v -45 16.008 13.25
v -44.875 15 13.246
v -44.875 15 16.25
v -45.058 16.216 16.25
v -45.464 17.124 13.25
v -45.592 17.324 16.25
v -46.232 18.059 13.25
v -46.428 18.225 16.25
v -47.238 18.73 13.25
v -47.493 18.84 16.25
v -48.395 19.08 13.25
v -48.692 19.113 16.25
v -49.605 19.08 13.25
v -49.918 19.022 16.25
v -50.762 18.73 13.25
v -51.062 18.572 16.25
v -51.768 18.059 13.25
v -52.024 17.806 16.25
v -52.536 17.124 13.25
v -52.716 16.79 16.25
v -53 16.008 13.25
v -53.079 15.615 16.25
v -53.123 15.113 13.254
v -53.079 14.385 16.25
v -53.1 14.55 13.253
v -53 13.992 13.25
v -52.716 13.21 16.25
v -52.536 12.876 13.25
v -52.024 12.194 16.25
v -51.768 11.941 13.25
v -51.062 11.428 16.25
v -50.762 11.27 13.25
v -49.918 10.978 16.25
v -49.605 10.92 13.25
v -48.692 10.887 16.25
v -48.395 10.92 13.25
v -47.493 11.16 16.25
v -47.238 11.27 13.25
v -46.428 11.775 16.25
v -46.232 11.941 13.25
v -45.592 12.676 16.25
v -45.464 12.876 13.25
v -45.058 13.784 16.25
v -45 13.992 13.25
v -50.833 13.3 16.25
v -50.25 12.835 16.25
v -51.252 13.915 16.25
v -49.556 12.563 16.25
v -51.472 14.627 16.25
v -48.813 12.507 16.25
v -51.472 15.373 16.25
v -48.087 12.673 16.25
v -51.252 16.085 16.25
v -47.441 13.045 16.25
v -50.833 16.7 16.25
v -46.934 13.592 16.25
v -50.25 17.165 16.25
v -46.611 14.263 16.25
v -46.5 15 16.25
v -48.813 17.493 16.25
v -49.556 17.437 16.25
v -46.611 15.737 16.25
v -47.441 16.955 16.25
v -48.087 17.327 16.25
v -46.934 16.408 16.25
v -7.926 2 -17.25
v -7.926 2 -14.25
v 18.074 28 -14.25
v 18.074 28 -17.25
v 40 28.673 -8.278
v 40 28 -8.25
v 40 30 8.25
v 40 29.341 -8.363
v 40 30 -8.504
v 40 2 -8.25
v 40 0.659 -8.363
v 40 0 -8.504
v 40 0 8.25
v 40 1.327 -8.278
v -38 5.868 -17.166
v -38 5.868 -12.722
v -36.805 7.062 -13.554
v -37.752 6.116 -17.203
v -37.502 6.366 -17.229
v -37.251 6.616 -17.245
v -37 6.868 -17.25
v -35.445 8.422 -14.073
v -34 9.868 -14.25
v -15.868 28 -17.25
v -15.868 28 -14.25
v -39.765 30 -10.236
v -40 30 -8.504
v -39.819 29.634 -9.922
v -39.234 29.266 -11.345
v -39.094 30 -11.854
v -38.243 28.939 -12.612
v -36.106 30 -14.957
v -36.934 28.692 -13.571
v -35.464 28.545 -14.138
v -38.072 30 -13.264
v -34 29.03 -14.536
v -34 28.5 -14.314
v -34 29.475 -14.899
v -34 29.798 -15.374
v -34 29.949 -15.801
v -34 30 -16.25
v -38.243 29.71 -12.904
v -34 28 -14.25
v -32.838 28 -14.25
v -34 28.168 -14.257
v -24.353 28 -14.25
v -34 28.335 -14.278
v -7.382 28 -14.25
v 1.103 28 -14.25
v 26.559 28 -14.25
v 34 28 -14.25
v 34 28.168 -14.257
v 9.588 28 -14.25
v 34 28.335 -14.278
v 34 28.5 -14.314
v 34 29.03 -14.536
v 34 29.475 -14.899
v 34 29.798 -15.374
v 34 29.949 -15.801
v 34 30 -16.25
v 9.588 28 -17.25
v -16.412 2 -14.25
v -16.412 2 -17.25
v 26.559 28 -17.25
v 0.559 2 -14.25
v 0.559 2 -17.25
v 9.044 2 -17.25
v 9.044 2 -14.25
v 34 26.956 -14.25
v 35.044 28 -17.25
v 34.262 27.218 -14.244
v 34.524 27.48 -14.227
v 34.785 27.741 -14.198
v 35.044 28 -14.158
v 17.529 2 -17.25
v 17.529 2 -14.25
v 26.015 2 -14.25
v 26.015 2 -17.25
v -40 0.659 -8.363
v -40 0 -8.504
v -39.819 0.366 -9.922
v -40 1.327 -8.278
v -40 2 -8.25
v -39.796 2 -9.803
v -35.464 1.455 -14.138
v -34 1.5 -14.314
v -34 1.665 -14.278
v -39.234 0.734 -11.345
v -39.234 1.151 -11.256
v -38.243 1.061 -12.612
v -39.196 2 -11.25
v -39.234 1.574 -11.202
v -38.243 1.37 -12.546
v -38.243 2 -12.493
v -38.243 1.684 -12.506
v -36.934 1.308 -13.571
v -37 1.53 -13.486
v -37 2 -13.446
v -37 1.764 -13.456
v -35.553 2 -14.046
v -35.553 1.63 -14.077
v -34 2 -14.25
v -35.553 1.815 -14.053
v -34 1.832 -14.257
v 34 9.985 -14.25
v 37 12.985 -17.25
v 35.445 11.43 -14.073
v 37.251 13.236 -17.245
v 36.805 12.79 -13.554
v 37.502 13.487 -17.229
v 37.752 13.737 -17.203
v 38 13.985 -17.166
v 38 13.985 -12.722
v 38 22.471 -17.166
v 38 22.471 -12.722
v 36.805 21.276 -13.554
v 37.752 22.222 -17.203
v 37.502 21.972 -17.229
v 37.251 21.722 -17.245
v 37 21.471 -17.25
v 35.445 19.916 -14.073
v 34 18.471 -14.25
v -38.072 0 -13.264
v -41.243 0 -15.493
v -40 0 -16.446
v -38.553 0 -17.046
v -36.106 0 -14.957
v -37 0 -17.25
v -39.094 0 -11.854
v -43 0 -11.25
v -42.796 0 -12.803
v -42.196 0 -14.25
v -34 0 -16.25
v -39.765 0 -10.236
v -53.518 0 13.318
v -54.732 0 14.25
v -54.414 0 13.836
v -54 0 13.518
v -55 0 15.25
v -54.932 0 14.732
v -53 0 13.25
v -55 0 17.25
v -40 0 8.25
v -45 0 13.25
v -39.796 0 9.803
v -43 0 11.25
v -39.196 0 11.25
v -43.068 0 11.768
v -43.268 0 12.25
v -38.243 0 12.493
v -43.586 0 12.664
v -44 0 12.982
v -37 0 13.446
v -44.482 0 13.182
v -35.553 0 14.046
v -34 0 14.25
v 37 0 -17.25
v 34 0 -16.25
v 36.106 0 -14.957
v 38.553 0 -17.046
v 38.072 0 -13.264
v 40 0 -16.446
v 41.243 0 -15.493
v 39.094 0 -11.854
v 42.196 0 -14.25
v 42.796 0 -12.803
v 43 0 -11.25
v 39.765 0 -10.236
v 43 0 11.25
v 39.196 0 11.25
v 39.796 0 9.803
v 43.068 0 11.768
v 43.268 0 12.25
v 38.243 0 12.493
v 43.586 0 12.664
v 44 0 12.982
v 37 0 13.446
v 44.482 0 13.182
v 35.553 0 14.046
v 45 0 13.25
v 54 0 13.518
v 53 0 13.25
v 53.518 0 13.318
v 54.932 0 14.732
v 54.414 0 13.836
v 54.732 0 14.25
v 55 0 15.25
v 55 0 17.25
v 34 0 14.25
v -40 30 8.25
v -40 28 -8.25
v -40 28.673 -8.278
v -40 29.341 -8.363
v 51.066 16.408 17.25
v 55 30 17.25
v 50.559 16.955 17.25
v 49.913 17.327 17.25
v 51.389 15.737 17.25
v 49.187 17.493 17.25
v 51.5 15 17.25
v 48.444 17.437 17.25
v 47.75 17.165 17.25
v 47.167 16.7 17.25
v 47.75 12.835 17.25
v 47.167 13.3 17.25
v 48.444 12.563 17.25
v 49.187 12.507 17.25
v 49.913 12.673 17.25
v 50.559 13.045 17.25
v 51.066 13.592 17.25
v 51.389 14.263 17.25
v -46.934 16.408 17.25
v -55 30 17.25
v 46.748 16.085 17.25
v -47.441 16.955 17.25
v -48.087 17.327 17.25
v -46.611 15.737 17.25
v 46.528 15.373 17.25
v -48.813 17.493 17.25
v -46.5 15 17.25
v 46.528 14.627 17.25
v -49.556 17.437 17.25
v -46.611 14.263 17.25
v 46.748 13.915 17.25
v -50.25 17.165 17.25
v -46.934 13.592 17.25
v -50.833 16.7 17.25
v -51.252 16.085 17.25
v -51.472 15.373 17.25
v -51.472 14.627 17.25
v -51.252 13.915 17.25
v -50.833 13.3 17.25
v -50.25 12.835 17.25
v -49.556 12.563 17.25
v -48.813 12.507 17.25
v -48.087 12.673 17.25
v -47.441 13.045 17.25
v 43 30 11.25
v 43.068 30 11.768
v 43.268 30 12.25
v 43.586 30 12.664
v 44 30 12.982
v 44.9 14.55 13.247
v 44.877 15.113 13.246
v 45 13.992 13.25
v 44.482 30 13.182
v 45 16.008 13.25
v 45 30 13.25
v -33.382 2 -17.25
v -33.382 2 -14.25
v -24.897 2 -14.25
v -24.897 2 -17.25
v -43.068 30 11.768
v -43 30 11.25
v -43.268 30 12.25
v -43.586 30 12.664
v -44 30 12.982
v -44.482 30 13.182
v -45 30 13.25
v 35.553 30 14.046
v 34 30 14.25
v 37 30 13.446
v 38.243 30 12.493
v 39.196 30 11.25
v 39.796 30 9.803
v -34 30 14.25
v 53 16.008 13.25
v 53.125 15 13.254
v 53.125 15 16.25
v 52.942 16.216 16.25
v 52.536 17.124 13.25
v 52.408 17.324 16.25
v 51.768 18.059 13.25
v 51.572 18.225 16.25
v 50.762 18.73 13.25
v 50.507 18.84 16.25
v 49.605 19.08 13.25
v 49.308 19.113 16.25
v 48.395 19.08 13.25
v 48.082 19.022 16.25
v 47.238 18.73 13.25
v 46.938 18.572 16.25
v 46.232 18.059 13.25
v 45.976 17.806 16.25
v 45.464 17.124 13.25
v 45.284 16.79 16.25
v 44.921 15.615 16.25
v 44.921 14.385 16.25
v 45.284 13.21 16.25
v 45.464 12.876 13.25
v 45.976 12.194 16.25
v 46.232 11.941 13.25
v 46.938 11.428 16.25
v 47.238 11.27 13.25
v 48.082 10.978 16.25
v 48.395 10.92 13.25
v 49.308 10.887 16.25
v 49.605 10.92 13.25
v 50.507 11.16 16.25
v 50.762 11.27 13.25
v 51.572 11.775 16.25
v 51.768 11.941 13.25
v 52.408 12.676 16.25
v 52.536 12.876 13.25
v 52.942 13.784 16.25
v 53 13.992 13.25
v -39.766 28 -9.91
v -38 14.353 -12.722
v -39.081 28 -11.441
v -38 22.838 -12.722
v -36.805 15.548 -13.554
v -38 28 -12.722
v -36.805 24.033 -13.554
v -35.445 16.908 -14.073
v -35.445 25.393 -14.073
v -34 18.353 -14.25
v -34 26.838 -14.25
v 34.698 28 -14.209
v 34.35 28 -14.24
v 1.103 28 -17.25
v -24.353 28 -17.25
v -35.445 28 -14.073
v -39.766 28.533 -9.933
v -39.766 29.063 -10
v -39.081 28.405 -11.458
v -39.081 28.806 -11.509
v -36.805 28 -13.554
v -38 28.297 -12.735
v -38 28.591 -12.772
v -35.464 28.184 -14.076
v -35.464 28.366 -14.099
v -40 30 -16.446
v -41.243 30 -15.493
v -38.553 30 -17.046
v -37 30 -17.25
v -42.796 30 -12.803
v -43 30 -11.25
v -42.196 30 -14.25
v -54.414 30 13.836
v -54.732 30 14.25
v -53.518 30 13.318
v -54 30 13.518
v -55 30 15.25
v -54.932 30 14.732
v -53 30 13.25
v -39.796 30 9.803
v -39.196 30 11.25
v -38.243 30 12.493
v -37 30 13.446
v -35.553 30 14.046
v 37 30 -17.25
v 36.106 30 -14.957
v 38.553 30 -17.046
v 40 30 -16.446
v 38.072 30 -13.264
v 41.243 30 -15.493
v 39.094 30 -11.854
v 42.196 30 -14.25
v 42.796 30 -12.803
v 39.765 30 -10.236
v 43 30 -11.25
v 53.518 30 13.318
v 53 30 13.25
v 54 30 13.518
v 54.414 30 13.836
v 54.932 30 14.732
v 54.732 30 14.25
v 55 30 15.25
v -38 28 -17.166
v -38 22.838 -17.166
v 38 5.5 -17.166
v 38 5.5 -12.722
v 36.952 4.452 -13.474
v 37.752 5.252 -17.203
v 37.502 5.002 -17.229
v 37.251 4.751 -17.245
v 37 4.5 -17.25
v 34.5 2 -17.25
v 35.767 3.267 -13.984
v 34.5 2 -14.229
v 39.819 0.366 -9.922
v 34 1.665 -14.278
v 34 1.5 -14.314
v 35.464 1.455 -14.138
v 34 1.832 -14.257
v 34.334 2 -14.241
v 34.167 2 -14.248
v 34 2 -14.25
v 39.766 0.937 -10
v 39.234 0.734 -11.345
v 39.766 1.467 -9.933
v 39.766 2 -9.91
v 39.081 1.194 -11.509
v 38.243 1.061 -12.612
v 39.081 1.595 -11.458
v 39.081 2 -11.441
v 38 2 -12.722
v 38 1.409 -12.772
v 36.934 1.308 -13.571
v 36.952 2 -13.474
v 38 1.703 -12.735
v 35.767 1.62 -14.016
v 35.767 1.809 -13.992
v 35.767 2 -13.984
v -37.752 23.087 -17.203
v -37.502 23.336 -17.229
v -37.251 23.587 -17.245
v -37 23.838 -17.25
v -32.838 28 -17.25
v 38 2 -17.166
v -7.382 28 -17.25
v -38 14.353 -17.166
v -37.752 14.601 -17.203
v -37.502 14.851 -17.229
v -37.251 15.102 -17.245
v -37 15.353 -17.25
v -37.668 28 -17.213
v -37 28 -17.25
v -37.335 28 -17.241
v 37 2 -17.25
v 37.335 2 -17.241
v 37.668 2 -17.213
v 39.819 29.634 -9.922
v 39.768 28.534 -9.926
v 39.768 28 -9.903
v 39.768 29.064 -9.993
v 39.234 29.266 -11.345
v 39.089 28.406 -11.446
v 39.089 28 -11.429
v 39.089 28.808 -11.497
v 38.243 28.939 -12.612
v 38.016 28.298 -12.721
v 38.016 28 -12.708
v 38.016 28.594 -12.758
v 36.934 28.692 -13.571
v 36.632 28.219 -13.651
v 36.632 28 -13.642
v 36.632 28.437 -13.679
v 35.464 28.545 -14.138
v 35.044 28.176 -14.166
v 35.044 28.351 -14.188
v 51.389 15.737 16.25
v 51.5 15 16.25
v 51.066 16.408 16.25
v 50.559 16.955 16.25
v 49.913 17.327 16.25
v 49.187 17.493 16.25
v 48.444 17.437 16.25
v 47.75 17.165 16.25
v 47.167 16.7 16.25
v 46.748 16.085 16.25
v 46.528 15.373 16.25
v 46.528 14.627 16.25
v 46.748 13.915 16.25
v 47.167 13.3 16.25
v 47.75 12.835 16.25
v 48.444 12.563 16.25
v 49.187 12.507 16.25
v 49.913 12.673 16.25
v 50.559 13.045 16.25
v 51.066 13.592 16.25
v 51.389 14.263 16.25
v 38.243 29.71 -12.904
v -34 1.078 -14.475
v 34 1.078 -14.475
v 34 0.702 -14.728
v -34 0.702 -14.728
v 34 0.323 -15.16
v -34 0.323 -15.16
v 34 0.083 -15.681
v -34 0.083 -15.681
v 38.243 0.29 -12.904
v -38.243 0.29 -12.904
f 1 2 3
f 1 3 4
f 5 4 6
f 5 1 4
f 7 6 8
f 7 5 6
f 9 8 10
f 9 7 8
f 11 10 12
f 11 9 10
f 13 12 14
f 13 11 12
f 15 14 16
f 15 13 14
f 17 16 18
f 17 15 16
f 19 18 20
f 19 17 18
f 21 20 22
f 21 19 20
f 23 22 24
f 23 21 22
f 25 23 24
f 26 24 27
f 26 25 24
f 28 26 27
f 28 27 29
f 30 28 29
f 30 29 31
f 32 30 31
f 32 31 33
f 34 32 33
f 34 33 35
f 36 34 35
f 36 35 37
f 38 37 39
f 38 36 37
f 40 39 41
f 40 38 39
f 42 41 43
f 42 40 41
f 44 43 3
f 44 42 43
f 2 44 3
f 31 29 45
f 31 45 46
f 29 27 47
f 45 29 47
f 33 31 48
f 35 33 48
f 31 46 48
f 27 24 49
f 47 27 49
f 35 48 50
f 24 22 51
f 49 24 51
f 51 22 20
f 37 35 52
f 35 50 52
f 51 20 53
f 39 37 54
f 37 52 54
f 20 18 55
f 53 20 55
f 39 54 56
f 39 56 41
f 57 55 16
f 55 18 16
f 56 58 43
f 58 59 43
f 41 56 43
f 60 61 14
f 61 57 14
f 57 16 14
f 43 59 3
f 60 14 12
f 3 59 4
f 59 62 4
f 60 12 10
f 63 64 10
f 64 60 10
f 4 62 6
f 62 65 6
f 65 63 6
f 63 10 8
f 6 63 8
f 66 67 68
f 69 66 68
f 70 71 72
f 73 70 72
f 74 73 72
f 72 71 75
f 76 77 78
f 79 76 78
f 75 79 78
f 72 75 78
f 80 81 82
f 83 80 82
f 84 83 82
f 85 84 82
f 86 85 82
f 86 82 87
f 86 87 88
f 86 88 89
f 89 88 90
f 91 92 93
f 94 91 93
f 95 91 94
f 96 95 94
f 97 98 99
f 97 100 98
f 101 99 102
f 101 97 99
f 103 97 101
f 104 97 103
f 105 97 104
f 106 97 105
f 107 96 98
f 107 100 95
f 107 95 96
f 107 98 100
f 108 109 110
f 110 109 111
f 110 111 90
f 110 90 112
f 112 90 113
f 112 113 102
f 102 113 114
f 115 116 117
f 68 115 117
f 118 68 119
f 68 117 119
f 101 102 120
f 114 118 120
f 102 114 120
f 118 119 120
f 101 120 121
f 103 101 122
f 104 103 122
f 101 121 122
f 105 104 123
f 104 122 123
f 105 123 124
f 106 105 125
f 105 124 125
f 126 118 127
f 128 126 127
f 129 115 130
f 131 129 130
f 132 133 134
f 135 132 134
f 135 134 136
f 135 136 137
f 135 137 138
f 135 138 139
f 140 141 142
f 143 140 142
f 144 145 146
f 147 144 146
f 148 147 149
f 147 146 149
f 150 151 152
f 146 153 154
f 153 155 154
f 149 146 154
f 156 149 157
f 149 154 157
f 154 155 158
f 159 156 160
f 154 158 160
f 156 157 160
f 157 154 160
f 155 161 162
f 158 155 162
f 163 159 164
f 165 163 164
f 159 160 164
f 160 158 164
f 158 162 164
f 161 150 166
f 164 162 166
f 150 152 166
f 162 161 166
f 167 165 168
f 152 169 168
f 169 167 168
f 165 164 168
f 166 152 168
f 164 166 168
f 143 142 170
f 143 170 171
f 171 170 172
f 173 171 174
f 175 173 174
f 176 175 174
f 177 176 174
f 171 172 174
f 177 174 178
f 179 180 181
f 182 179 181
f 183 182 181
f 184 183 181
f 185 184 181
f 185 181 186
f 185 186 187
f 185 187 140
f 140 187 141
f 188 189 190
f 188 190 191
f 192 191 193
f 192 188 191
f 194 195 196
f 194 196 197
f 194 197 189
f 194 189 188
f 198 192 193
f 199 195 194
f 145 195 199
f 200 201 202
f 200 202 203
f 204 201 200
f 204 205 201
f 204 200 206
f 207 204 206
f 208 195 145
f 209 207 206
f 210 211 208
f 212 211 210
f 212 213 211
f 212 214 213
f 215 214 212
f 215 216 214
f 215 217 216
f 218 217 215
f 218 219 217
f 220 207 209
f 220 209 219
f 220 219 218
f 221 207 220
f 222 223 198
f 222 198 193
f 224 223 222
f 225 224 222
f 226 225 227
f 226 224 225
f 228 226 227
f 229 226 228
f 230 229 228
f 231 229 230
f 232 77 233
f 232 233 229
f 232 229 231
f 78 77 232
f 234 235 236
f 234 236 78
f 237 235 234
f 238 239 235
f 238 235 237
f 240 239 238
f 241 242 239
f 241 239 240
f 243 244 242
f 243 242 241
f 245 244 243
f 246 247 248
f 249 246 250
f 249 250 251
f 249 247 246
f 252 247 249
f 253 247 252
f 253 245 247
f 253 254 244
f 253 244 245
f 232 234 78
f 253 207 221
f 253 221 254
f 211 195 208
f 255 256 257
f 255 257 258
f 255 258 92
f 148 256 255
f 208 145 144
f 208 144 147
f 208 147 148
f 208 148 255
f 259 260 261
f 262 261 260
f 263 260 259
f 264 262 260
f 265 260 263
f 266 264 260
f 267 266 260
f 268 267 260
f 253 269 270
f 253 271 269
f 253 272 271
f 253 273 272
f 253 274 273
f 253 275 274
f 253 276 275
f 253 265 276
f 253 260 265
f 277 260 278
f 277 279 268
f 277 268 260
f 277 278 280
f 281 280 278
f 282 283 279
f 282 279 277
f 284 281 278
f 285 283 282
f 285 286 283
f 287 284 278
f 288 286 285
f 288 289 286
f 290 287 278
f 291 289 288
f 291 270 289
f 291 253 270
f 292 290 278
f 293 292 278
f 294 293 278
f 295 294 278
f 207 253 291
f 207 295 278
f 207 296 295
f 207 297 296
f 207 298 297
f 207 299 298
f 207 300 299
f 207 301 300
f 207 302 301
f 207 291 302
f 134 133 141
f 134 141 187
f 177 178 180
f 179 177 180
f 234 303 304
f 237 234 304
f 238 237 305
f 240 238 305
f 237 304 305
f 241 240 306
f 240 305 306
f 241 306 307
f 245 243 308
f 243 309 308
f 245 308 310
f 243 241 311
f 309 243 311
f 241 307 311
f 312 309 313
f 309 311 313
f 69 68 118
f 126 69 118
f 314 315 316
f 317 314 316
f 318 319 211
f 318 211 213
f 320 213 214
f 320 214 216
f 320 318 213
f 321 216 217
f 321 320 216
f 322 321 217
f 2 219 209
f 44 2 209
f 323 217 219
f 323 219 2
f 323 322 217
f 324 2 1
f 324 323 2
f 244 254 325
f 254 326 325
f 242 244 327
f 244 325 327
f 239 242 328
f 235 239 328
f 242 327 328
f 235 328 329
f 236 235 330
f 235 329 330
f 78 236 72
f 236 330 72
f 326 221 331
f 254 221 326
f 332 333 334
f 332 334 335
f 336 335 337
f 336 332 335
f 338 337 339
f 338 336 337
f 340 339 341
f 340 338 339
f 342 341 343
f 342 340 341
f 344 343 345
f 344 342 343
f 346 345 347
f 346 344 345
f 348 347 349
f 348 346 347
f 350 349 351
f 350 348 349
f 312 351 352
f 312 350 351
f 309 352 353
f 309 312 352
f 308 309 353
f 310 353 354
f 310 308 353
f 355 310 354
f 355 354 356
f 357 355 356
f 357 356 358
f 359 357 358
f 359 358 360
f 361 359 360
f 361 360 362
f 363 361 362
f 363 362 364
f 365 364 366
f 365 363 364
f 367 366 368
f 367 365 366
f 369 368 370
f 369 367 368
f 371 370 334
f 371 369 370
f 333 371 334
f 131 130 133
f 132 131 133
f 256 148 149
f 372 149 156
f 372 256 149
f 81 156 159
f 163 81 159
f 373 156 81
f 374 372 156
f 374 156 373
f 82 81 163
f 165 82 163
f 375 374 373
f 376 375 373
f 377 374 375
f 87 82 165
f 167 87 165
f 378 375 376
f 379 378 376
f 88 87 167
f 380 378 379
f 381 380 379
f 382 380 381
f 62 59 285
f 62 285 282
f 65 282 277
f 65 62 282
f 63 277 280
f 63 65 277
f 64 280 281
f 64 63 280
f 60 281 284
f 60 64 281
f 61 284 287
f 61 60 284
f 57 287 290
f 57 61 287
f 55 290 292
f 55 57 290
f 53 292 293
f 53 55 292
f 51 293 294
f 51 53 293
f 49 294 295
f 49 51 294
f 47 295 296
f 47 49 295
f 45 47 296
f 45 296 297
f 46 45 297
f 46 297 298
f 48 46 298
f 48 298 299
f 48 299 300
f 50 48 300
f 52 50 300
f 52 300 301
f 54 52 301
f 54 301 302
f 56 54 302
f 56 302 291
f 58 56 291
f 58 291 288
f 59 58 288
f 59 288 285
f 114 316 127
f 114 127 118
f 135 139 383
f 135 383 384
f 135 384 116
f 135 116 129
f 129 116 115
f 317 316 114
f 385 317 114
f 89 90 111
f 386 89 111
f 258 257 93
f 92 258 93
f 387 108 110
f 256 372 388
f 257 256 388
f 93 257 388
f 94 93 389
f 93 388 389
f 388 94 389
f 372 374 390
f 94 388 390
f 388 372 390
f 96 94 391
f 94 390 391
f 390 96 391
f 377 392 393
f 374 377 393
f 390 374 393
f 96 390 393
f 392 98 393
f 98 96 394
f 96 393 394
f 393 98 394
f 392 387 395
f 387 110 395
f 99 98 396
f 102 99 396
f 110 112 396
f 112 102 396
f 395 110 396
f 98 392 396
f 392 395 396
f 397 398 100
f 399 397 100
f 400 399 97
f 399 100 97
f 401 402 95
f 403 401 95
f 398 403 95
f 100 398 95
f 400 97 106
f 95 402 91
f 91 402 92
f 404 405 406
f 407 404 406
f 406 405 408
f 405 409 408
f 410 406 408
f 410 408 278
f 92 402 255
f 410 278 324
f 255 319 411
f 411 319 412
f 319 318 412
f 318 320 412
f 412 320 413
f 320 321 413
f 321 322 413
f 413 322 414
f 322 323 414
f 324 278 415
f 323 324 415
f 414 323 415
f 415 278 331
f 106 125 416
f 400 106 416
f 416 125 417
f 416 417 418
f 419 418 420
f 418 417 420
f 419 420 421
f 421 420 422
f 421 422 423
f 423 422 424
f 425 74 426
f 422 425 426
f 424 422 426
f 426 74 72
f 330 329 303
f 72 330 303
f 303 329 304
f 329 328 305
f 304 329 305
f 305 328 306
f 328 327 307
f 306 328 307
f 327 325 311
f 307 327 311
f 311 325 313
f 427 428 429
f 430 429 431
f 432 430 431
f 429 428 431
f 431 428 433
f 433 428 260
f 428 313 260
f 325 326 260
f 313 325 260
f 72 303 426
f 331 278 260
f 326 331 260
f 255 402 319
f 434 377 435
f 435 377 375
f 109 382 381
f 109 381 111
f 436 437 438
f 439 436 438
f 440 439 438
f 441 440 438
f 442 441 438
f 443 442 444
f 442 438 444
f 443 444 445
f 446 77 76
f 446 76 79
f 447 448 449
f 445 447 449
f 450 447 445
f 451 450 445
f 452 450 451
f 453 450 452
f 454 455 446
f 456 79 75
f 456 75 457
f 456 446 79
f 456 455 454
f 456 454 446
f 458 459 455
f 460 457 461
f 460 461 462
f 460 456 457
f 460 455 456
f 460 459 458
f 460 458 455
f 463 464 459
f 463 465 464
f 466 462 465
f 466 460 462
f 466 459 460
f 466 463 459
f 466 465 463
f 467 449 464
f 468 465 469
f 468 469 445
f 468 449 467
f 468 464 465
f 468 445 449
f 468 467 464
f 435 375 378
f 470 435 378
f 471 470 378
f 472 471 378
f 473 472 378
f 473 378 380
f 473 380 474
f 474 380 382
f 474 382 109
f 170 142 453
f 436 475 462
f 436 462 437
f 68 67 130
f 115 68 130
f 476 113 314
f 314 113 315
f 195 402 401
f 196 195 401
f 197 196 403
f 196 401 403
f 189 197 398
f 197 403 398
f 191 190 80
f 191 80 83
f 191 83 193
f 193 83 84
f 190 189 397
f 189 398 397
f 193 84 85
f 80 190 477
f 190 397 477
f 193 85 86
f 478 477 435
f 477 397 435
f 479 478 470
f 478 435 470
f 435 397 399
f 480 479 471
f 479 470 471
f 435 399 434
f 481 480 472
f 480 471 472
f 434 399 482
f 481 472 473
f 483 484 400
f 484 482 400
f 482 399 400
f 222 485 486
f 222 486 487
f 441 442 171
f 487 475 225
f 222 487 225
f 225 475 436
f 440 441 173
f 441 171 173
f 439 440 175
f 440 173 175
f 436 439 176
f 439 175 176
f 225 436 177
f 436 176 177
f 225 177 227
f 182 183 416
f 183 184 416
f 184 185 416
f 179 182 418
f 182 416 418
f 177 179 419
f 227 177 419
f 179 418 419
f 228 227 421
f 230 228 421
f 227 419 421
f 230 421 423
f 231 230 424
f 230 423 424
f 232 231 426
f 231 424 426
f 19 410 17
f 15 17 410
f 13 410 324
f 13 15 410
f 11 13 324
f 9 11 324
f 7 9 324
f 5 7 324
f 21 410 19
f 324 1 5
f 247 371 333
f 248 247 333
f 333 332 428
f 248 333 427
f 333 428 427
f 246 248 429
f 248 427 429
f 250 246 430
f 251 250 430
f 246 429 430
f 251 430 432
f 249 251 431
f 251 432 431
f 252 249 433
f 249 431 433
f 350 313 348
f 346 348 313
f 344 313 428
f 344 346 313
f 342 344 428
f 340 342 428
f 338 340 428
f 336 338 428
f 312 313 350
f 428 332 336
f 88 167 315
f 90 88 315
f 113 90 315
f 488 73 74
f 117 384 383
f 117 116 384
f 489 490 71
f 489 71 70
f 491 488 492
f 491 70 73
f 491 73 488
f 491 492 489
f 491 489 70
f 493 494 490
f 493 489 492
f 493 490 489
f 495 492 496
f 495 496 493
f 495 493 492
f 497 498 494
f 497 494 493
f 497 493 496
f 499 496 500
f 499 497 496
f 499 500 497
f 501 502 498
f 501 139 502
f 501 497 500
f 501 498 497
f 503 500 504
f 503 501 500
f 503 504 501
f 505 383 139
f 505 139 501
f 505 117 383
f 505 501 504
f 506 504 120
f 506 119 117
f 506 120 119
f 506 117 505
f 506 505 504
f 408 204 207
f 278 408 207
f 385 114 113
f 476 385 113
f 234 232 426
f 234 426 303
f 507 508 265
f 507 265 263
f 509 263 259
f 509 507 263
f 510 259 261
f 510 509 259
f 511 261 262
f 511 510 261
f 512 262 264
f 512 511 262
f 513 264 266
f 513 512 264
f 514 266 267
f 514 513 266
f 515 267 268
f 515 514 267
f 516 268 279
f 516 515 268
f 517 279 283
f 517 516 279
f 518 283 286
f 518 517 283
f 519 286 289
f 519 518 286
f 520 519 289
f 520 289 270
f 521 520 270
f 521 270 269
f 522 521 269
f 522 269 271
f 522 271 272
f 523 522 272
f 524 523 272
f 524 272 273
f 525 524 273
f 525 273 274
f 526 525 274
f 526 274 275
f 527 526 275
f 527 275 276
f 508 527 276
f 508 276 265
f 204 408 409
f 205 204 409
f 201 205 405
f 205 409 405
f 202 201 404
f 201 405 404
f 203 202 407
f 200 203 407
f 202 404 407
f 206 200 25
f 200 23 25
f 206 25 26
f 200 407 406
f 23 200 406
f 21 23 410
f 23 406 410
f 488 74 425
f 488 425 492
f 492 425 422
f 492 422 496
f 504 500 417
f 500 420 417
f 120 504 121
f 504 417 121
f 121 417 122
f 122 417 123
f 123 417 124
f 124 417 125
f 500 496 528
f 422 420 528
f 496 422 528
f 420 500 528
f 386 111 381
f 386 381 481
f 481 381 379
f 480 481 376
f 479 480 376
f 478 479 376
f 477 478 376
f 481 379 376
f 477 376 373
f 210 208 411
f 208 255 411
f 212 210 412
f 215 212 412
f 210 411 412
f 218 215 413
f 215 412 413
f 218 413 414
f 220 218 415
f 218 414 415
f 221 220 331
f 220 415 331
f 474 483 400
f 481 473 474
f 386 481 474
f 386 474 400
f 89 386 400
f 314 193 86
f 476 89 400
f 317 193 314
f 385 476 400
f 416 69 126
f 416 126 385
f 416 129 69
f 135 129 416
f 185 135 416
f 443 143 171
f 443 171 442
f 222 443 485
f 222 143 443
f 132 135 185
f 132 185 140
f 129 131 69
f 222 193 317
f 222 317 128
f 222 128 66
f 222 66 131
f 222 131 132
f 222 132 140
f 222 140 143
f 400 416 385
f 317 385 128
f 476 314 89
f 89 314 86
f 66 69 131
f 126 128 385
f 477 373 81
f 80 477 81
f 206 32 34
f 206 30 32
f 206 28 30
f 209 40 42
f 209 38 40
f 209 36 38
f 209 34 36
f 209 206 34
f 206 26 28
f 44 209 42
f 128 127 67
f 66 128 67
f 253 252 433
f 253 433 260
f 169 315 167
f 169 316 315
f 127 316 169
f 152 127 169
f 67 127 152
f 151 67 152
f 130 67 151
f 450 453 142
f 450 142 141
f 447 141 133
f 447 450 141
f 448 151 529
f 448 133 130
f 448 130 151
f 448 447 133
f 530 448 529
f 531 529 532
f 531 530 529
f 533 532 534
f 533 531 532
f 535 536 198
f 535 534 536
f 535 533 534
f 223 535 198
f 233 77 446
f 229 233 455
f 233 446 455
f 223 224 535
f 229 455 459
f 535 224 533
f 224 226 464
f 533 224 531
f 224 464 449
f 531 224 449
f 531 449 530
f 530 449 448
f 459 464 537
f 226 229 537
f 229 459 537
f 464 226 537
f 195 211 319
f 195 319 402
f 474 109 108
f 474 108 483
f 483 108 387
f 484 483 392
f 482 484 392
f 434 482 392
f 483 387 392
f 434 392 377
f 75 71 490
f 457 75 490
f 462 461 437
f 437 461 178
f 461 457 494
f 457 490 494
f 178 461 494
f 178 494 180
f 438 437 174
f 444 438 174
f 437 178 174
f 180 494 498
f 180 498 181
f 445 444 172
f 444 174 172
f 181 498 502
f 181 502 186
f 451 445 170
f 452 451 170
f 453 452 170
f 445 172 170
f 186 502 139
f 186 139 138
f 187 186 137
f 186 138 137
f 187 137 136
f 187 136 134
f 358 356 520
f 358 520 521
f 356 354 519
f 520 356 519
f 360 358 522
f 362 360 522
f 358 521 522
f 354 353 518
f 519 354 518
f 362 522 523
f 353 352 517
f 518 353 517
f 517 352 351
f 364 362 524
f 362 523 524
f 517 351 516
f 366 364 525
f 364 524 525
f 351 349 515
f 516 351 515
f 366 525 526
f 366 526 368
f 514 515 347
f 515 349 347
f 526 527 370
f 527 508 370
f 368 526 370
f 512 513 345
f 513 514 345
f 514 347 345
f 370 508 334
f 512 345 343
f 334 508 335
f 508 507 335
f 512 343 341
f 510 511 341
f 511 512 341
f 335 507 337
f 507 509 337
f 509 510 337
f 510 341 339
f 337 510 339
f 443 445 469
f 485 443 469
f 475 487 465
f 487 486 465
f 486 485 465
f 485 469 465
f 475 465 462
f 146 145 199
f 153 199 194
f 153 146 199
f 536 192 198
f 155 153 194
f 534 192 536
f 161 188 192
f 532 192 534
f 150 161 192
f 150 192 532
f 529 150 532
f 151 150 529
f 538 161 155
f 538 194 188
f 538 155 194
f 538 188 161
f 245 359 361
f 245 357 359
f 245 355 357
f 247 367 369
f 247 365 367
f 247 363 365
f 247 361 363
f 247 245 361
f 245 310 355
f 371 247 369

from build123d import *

# Parameters (mm, degrees)
F0_W     = 80
F0_H     = 28.5
F0_W_2   = 12
F0_H_2   = 4
F2_DEPTH = 30
F3_R     = 2
F4_R     = 2.5
F5_DEPTH = 17.25
F6_R     = 6
F8_DEPTH = 17.25
F4_R_2   = 4.125
F9_DEPTH = 16.25


# Not quite as in the source:
# - two fillets or chamfers of one size are made in one step


with BuildPart() as f2:
    # F0 (on Front) → F2 (new body)
    with BuildSketch(Plane.XZ):
        Polygon((43, 17.25), (-43, 17.25), (-43, 13.25), (-43, -17.25), (43, -17.25), (43, 13.25), align=None)
        Rectangle(F0_W, F0_H, mode=Mode.SUBTRACT)
        with Locations((49, 15.25)):
            Rectangle(F0_W_2, F0_H_2)
        with Locations((-49, 15.25)):
            Rectangle(F0_W_2, F0_H_2)
    extrude(amount=-F2_DEPTH)

    # F3
    f3_edges = [f2.edges().sort_by_distance(p)[0] for p in [
        (0, 0, -14.25),
        (0, 30, -14.25),
        (-43, 15, 13.25),
        (43, 15, 13.25),
        (55, 15, 13.25),
        (-55, 15, 13.25),
    ]]
    fillet(f3_edges, radius=F3_R)

    # F4 (on Top) → F5 (cut, through all)
    with BuildSketch(Plane.XY):
        with Locations((49, 15)):
            Circle(F4_R)
        with Locations((-49, 15)):
            Circle(F4_R)
    extrude(amount=F5_DEPTH, mode=Mode.SUBTRACT)

    # F6 (call 1 of 6: OpenCascade refuses the feature's edges together)
    f6_edges = [f2.edges().sort_by_distance(p)[0] for p in [
        (-40, 15, 14.25),
    ]]
    fillet(f6_edges, radius=F6_R)

    # F6#2 (call 2 of 6)
    f6_2_edges = [f2.edges().sort_by_distance(p)[0] for p in [
        (-40, 15, -14.25),
    ]]
    fillet(f6_2_edges, radius=F6_R)

    # F6#3 (call 3 of 6)
    f6_3_edges = [f2.edges().sort_by_distance(p)[0] for p in [
        (40, 15, 14.25),
    ]]
    fillet(f6_3_edges, radius=F6_R)

    # F6#4 (call 4 of 6)
    f6_4_edges = [f2.edges().sort_by_distance(p)[0] for p in [
        (40, 15, -14.25),
    ]]
    fillet(f6_4_edges, radius=F6_R)

    # F6#5 (call 5 of 6)
    f6_5_edges = [f2.edges().sort_by_distance(p)[0] for p in [
        (-43, 15, -17.25),
    ]]
    fillet(f6_5_edges, radius=F6_R)

    # F6#6 (call 6 of 6)
    f6_6_edges = [f2.edges().sort_by_distance(p)[0] for p in [
        (43, 15, -17.25),
    ]]
    fillet(f6_6_edges, radius=F6_R)

    # F1 (on Top) → F8 (cut, through all)
    with BuildSketch(Plane.XY):
        Polygon((38, 2), (38, 5.5), (34.5, 2), align=None)
        Polygon((38, 13.9852813742), (38, 22.4705627485), (17.5294372515, 2), (26.0147186258, 2), align=None)
        Polygon((9.0441558773, 2), (35.0441558773, 28), (26.558874503, 28), (0.558874503, 2), align=None)
        Polygon((-7.9264068712, 2), (18.0735931288, 28), (9.5883117546, 28), (-16.4116882454, 2), align=None)
        Polygon((-24.8969696197, 2), (1.1030303803, 28), (-7.3822509939, 28), (-33.3822509939, 2), align=None)
        Polygon((-38, 5.8675323681), (-15.8675323681, 28), (-24.3528137424, 28), (-38, 14.3528137424), align=None)
        Polygon((-38, 22.8380951166), (-32.8380951166, 28), (-38, 28), align=None)
    extrude(amount=-F8_DEPTH, mode=Mode.SUBTRACT)

    # F4 (on Top) → F9 (cut)
    with BuildSketch(Plane.XY):
        with Locations((-49, 15)):
            Circle(F4_R_2)
        with Locations((-49, 15)):
            Circle(F4_R, mode=Mode.SUBTRACT)
        with Locations((49, 15)):
            Circle(F4_R_2)
        with Locations((49, 15)):
            Circle(F4_R, mode=Mode.SUBTRACT)
    extrude(amount=F9_DEPTH, mode=Mode.SUBTRACT)


solid = f2.part
